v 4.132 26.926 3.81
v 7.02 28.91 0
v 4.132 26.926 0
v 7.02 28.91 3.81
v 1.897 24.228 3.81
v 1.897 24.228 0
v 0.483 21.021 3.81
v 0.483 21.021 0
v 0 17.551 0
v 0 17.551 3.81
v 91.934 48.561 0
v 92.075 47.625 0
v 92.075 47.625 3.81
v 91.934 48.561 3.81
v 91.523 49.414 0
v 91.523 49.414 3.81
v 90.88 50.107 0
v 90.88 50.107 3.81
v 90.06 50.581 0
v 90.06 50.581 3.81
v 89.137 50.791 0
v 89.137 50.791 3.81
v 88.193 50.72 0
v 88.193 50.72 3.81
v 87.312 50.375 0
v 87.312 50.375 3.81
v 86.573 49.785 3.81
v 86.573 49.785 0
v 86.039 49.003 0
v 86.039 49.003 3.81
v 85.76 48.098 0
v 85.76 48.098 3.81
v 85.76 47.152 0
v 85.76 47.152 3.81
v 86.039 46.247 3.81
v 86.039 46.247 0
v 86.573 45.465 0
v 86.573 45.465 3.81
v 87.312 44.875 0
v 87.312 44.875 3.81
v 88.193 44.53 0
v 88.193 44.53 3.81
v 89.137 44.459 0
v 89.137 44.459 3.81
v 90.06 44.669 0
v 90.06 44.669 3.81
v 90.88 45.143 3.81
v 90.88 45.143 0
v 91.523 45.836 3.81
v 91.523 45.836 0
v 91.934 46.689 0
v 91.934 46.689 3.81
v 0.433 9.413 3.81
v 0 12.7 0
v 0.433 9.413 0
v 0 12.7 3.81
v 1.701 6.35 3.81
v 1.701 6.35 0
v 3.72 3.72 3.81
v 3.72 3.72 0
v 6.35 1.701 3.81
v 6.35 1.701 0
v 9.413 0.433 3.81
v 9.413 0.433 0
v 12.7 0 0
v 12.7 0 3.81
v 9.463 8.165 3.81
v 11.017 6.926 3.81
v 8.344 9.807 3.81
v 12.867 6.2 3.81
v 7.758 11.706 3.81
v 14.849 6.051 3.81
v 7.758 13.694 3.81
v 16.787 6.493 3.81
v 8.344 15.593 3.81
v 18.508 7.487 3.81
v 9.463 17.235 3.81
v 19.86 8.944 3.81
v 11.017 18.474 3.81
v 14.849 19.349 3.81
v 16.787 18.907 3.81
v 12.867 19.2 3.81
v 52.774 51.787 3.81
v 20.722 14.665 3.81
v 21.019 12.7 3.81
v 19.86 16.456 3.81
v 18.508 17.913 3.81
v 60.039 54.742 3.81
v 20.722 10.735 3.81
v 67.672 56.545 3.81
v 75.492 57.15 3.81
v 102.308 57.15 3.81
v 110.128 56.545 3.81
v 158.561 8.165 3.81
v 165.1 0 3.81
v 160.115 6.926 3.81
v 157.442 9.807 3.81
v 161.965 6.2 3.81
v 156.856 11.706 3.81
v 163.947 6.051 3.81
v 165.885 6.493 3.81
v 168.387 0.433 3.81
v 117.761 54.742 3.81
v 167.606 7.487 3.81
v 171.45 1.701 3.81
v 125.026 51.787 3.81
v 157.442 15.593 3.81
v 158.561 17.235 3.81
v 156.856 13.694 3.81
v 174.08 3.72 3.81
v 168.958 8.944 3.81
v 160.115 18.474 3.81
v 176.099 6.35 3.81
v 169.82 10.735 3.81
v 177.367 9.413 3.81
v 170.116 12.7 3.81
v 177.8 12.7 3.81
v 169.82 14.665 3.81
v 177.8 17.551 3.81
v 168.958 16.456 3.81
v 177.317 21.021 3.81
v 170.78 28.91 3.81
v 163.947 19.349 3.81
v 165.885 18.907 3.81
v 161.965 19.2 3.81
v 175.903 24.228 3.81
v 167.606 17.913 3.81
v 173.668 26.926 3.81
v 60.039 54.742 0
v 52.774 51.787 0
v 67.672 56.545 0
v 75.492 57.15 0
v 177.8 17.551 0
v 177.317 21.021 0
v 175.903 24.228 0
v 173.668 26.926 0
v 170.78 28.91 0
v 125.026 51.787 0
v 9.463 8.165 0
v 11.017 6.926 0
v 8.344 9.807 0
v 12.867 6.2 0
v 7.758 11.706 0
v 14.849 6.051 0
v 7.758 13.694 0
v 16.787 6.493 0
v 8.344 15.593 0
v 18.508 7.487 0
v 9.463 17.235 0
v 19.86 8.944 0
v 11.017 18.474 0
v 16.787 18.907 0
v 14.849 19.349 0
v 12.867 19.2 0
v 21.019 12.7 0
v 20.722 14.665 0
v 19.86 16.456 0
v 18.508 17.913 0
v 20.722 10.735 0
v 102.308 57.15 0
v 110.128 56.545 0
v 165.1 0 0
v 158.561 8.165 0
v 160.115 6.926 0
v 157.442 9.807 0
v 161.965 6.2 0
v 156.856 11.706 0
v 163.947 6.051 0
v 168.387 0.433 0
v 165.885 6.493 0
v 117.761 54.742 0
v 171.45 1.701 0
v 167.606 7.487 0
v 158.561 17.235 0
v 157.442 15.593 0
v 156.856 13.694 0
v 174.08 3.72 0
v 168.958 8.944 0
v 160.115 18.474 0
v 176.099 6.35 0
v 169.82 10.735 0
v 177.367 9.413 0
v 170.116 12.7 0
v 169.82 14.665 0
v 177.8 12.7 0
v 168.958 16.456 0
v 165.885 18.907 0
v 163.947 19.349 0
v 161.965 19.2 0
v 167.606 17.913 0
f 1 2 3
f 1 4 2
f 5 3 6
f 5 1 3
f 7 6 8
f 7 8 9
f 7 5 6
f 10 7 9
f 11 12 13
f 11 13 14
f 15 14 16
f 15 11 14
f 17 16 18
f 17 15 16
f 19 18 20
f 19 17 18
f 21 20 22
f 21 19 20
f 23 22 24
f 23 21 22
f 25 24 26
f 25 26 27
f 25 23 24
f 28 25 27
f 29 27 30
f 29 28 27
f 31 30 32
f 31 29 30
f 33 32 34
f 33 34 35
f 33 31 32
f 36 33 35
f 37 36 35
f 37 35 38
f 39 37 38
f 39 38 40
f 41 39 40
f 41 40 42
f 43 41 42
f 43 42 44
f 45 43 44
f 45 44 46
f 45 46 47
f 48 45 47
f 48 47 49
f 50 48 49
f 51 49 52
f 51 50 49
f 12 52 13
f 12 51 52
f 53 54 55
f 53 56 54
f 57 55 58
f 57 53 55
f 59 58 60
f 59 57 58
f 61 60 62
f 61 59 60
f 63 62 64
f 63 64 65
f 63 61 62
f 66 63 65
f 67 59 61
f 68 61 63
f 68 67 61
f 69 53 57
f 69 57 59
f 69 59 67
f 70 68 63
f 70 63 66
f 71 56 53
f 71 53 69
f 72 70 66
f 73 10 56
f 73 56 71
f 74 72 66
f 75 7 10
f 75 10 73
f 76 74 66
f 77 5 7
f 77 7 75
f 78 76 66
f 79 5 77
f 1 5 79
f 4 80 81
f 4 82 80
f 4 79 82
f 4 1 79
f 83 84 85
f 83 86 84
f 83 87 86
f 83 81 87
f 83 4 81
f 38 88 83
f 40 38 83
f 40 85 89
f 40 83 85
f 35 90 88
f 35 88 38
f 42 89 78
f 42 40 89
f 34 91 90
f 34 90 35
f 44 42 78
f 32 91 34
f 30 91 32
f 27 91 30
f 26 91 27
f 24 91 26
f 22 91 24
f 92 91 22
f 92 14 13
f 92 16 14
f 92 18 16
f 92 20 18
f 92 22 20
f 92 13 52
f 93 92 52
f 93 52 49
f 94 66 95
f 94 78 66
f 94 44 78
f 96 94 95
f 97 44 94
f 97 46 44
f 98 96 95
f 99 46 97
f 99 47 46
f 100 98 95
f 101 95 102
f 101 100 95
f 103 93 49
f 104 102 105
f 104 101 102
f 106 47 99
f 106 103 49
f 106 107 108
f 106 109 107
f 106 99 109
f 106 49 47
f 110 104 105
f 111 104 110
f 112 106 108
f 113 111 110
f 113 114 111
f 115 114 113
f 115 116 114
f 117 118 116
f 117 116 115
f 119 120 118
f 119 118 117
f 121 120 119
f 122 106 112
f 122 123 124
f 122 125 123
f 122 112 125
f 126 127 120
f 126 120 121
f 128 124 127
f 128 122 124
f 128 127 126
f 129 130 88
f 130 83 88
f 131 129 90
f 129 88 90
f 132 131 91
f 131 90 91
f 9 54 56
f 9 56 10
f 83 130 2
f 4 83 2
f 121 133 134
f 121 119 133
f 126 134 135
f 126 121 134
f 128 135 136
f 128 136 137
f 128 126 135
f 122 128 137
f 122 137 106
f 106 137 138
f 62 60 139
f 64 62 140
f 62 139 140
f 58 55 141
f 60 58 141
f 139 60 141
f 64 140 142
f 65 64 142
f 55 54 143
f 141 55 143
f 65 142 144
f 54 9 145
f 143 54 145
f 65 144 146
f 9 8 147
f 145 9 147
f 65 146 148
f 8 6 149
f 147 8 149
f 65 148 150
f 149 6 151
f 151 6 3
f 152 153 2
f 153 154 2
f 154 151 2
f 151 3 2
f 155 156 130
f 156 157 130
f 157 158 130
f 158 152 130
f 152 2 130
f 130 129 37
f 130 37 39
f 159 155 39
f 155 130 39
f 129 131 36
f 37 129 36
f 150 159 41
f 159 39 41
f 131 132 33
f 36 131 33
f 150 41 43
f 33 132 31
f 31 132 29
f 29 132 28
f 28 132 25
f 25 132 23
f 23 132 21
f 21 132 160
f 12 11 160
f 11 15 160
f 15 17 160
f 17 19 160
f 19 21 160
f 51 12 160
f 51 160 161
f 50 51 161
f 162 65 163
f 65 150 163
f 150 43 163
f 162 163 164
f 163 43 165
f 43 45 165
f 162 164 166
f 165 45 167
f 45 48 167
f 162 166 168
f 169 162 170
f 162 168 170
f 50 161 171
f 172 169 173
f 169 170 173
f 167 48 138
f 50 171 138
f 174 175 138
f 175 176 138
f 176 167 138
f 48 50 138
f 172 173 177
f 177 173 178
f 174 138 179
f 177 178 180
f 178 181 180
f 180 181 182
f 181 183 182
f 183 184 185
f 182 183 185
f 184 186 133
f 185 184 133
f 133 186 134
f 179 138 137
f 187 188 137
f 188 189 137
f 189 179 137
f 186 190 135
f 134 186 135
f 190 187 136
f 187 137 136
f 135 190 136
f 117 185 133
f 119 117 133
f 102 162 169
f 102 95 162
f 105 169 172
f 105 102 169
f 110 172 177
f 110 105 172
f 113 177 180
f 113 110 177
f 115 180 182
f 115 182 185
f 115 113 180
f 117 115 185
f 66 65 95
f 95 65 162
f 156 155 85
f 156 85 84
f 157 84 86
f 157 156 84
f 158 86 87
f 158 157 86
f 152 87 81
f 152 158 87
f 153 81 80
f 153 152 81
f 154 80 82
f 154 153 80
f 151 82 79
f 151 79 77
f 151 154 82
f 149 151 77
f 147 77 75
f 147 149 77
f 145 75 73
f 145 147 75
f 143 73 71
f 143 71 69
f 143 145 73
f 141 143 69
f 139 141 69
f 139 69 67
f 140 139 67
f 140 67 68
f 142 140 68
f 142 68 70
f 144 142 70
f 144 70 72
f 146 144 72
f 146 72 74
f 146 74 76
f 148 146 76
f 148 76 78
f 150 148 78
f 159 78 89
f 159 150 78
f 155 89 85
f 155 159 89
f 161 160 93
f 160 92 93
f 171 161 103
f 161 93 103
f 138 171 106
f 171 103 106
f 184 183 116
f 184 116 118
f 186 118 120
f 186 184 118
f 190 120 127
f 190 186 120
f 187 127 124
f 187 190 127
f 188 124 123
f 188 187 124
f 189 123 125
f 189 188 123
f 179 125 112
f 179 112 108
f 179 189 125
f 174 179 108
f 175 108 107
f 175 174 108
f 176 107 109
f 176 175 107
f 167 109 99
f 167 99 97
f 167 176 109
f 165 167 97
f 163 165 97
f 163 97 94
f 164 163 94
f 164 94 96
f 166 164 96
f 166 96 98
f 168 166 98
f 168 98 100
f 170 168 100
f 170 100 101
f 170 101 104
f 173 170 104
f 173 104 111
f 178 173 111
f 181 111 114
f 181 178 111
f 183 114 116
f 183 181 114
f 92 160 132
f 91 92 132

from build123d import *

# Parameters (mm, degrees)
F0_W     = 177.8
F0_H     = 25.4
F0_R     = 6.6675
F0_R_2   = 3.175
F1_DEPTH = 3.81
F2_R     = 50.8
F3_R     = 12.7


with BuildPart() as f1:
    # F0 (on Top) → F1 (new body)
    with BuildSketch(Plane.XY):
        with Locations((88.9, 12.7)):
            Rectangle(F0_W, F0_H)
        with Locations((14.351, 12.7)):
            Circle(F0_R, mode=Mode.SUBTRACT)
        with Locations((163.449, 12.7)):
            Circle(F0_R, mode=Mode.SUBTRACT)
        Polygon((63.5, 57.15), (0, 25.4), (177.8, 25.4), (114.3, 57.15), align=None)
        with Locations((88.9, 47.625)):
            Circle(F0_R_2, mode=Mode.SUBTRACT)
    extrude(amount=F1_DEPTH)

    # F2
    f2_edges = [f1.edges().sort_by_distance(p)[0] for p in [
        (63.5, 57.15, 1.905),
        (114.3, 57.15, 1.905),
    ]]
    fillet(f2_edges, radius=F2_R)

    # F3
    f3_edges = [f1.edges().sort_by_distance(p)[0] for p in [
        (0, 25.4, 1.905),
        (0, 0, 1.905),
        (177.8, 0, 1.905),
        (177.8, 25.4, 1.905),
    ]]
    fillet(f3_edges, radius=F3_R)


solid = f1.part
